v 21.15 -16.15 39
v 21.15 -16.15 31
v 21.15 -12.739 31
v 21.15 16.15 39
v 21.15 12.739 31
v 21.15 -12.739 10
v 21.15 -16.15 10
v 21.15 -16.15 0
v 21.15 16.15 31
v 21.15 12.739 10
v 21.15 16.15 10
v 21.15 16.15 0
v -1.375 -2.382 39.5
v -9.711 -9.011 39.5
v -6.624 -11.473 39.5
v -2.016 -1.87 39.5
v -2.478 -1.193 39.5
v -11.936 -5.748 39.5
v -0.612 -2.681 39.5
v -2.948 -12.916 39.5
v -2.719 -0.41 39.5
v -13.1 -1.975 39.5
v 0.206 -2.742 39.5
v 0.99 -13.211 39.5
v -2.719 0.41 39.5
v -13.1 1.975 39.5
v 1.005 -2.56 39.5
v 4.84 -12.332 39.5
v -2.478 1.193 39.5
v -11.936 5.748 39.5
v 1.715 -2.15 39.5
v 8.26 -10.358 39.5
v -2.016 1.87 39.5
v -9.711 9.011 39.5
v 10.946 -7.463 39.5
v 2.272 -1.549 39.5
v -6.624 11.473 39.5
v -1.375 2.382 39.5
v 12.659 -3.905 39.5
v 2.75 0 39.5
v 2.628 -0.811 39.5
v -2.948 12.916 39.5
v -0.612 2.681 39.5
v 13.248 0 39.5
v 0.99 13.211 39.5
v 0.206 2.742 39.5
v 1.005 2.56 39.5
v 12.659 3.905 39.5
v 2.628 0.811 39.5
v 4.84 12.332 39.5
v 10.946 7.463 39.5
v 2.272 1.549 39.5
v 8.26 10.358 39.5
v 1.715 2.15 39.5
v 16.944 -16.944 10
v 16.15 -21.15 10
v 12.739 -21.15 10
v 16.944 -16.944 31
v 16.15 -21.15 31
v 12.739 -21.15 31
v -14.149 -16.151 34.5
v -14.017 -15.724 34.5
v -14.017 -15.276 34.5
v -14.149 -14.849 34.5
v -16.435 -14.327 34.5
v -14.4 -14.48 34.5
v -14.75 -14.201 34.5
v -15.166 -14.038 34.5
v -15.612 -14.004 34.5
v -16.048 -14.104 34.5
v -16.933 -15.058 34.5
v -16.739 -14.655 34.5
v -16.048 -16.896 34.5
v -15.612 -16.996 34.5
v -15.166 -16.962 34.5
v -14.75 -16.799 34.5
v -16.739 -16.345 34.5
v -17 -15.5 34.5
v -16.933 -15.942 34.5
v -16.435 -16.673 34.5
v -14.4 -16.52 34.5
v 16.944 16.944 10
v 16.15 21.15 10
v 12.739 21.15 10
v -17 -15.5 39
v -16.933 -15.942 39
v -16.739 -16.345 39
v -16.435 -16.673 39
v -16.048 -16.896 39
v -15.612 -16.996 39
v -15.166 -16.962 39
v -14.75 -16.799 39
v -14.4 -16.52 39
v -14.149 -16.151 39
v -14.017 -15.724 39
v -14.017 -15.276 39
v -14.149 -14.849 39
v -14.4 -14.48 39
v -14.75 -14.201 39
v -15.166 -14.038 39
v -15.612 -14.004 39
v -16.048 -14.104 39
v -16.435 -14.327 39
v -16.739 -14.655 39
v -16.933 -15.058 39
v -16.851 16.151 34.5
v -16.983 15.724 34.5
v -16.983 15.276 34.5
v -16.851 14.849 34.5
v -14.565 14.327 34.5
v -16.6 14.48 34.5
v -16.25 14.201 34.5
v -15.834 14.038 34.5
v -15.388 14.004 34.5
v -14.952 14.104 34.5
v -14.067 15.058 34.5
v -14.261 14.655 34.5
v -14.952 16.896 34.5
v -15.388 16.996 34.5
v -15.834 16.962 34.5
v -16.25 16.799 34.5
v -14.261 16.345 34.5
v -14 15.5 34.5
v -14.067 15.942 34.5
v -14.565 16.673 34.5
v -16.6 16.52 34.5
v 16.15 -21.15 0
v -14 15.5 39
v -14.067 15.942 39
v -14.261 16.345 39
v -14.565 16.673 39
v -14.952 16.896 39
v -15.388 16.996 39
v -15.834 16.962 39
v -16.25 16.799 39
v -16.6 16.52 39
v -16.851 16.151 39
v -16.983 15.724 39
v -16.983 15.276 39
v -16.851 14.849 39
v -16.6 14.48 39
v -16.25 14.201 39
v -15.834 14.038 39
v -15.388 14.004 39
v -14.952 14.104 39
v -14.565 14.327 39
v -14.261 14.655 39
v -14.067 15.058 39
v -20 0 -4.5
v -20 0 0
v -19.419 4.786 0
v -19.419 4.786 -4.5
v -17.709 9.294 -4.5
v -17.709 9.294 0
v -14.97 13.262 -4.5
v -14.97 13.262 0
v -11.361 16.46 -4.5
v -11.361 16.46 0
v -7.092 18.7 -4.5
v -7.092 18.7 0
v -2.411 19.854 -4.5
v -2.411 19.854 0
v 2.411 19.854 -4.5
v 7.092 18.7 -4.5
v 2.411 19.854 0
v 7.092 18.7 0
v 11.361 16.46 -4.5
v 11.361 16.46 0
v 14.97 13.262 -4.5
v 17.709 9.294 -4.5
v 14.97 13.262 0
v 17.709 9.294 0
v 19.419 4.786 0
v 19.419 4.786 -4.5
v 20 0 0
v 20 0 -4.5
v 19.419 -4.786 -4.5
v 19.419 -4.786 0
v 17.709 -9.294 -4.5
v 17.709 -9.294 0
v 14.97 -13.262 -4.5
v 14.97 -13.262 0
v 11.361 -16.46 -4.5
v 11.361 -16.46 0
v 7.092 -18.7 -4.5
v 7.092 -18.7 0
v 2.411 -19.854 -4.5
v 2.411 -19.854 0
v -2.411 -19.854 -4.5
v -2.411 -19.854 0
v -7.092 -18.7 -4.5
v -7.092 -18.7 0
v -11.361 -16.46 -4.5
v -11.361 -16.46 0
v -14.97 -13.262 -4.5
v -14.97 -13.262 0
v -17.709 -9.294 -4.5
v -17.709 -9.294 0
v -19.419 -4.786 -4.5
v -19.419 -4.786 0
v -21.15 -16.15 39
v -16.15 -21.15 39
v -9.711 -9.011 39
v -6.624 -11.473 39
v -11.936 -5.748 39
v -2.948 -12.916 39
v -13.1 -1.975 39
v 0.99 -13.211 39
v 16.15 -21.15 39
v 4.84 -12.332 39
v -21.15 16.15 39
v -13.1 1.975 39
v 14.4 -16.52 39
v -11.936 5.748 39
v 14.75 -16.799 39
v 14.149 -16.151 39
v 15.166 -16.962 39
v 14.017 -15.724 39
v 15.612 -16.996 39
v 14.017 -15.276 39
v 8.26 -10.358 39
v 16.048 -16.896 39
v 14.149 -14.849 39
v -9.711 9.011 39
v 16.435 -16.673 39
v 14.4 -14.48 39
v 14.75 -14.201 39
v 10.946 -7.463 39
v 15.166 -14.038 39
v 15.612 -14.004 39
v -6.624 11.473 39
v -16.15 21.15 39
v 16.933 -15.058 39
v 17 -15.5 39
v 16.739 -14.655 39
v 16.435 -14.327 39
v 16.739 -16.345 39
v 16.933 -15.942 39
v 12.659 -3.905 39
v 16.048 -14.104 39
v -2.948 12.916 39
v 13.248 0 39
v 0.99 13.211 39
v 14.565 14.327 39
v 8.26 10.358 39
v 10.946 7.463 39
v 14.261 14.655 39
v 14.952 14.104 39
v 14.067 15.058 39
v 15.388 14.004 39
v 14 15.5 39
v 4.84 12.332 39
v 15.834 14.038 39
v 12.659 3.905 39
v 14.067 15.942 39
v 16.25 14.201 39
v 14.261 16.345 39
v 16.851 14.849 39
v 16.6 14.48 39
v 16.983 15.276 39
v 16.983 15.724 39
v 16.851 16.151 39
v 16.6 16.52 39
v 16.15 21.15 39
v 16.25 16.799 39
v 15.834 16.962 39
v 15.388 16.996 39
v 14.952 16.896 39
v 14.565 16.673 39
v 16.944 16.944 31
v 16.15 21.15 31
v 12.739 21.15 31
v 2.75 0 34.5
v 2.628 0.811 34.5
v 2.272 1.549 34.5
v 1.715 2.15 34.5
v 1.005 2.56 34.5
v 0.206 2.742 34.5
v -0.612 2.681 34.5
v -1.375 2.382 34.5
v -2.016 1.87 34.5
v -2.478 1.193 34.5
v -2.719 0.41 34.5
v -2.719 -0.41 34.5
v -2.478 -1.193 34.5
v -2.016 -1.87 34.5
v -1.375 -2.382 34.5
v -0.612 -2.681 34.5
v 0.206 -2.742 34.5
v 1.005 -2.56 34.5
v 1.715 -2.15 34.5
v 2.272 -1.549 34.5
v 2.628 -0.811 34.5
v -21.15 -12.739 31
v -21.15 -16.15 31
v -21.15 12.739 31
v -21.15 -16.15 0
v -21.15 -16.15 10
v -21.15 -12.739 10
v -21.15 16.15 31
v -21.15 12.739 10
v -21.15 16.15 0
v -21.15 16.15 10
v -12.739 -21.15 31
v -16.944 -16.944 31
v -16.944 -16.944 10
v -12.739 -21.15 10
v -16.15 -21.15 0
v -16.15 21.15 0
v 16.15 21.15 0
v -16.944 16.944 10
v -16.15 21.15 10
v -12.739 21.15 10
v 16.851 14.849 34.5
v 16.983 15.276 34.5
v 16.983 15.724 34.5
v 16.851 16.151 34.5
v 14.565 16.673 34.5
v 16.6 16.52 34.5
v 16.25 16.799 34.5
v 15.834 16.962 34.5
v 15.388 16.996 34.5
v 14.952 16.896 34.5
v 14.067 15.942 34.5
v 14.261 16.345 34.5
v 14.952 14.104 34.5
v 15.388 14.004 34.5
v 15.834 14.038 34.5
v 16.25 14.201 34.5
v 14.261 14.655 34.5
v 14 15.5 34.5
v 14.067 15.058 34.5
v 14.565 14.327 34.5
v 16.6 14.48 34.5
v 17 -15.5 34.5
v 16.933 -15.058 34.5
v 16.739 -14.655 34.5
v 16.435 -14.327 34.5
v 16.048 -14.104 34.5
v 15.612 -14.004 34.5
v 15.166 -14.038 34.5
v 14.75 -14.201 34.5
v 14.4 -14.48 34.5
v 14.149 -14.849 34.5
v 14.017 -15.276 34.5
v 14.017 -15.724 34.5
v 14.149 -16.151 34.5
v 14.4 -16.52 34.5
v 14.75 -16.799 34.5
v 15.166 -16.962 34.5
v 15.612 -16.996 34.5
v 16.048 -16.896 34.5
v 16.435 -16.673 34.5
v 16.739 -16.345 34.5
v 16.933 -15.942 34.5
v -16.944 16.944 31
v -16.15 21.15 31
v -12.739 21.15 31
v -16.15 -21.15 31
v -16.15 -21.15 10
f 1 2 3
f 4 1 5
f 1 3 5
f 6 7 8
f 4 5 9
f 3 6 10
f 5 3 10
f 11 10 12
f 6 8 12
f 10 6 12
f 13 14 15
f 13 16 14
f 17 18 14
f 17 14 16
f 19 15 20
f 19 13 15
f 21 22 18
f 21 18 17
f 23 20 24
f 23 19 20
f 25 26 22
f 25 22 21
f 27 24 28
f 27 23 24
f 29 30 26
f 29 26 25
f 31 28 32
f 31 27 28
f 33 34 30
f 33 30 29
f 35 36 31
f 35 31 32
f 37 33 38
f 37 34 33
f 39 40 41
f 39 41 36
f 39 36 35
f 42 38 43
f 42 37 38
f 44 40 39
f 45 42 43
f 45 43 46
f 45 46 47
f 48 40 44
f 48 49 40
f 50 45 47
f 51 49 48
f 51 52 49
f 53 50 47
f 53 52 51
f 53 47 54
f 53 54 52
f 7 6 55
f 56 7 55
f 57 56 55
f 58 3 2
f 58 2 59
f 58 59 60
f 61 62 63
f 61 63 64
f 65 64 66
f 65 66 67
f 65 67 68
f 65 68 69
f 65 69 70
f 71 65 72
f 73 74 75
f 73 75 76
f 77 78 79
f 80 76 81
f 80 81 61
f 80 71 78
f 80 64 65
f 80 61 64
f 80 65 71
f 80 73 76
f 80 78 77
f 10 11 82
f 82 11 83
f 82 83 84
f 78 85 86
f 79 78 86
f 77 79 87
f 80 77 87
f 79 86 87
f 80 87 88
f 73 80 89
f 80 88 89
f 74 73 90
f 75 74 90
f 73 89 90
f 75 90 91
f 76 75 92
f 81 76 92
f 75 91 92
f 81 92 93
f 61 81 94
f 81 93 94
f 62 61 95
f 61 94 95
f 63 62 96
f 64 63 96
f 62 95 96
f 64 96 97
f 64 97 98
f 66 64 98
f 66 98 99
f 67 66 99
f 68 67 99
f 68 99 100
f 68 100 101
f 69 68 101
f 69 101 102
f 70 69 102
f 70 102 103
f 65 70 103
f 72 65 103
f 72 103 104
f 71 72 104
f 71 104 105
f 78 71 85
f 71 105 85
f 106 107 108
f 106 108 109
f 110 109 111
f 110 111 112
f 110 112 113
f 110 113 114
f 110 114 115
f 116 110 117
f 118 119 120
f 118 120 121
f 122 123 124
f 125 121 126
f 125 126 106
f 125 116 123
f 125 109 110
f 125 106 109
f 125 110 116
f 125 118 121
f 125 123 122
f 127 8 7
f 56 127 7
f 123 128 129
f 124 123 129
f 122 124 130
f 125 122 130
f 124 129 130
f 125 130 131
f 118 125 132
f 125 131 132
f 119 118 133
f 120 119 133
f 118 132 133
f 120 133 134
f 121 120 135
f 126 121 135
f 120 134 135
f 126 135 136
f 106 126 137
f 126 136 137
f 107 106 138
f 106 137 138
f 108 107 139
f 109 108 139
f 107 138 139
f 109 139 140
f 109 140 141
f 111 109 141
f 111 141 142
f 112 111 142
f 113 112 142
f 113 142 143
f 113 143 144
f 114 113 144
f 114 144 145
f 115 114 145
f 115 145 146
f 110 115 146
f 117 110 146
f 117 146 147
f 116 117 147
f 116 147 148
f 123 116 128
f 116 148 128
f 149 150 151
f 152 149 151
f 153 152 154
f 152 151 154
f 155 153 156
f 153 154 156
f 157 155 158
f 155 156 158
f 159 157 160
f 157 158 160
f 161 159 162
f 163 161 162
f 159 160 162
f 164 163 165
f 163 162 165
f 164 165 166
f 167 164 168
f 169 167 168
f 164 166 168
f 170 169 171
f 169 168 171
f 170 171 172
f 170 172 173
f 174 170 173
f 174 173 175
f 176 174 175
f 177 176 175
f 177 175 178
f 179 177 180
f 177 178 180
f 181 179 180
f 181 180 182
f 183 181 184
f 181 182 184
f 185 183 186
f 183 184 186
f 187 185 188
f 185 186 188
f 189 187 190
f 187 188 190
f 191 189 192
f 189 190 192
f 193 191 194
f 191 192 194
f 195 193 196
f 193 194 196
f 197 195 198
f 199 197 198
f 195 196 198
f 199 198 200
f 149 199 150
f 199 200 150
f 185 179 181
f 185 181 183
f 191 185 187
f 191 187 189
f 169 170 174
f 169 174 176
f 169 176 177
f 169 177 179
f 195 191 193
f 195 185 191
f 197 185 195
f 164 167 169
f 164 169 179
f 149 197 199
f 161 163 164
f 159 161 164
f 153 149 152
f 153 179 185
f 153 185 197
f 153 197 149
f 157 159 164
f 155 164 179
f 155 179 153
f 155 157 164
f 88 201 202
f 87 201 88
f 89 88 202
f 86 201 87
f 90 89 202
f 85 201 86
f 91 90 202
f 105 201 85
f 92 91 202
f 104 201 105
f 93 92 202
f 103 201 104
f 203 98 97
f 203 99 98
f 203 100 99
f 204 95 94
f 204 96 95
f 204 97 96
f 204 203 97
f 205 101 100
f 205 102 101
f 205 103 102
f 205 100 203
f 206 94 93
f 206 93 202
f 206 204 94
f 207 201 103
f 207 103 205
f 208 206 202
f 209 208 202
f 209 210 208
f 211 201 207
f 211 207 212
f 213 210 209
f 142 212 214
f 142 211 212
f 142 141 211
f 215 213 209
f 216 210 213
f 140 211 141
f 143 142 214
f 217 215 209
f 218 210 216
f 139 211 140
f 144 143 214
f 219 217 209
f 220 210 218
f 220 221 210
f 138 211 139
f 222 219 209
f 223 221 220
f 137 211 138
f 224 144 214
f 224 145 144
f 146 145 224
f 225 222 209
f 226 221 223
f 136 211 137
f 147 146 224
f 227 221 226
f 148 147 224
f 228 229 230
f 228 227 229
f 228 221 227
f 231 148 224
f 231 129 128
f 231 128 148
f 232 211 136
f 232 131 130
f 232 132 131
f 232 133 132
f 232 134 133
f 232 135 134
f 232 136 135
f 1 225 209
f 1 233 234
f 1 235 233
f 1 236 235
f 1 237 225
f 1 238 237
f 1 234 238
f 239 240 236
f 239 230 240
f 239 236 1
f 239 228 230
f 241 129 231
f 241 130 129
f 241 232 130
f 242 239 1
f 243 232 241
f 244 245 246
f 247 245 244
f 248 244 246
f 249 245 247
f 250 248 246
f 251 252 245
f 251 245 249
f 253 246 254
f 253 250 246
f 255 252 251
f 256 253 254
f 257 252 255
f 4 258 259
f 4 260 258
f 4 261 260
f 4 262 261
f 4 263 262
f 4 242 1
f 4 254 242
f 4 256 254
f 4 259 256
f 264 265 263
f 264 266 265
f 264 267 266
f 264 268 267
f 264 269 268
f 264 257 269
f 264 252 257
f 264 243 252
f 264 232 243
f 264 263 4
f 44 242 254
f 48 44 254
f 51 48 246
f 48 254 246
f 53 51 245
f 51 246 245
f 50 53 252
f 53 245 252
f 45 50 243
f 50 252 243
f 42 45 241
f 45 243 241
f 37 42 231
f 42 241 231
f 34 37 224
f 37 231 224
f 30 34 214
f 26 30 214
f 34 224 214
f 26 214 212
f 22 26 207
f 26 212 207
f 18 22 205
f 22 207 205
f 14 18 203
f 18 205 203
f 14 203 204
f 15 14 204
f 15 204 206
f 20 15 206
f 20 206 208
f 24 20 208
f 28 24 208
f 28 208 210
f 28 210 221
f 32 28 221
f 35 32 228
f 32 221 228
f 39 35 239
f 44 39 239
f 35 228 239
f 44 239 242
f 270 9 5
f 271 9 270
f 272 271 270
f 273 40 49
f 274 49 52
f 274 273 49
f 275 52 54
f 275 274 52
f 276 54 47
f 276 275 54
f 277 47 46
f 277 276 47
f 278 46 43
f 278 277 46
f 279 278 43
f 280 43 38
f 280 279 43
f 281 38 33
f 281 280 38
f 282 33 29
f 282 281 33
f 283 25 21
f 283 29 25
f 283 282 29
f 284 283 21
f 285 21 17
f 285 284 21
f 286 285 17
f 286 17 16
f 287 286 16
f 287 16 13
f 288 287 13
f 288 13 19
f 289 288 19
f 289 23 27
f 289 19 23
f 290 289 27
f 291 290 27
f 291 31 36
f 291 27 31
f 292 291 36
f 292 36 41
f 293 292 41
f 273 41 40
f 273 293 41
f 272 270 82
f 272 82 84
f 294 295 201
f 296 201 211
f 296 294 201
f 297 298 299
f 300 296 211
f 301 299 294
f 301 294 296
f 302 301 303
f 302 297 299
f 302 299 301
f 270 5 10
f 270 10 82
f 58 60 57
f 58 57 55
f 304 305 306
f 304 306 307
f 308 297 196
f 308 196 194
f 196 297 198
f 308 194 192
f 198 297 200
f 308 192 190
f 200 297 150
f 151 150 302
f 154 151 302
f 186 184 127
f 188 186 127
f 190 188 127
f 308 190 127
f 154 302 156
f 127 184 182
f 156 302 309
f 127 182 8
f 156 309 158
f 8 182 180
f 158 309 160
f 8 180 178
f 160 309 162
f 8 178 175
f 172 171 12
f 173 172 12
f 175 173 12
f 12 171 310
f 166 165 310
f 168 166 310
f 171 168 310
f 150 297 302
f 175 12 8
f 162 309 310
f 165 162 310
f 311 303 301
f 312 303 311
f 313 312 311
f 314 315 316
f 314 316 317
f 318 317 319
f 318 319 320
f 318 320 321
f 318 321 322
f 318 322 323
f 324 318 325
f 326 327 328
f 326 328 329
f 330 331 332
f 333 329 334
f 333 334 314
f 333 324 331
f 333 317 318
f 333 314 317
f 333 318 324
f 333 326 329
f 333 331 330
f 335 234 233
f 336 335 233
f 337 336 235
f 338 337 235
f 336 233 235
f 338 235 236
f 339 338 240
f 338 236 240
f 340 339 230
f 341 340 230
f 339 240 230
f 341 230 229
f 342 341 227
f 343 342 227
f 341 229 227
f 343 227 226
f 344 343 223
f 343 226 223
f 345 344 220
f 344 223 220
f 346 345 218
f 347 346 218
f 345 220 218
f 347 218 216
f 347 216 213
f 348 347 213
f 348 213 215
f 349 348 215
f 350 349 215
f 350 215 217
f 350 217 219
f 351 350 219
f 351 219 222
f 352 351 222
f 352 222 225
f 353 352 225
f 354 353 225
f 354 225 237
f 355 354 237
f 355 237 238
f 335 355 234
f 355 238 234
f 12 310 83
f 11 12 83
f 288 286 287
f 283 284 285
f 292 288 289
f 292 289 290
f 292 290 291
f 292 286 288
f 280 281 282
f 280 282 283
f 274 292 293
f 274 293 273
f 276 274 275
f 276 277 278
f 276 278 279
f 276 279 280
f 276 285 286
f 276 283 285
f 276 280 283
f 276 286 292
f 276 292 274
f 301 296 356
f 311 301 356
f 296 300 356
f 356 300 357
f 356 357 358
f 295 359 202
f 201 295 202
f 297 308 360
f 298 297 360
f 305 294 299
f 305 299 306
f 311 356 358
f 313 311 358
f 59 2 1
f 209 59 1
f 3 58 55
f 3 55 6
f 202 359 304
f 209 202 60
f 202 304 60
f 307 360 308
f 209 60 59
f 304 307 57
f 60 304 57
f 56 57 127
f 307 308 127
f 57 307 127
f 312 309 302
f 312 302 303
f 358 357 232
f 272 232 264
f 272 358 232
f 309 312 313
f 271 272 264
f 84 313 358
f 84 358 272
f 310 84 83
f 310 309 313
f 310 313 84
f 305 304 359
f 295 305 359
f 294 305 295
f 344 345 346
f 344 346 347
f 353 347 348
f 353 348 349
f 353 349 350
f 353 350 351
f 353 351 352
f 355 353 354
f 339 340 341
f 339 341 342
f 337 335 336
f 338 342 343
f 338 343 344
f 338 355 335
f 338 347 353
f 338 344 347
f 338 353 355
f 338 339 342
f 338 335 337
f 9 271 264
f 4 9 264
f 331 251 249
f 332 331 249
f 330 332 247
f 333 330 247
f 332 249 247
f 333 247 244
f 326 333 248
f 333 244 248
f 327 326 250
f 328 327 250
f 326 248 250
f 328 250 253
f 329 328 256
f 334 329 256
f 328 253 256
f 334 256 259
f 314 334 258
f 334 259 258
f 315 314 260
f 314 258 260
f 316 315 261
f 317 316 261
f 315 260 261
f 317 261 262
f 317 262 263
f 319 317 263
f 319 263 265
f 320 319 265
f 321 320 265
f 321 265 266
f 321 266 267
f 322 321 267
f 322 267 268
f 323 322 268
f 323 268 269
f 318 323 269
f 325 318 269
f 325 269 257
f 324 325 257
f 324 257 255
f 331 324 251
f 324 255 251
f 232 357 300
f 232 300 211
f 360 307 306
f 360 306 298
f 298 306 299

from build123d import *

# Parameters (mm, degrees)
SKETCH2_W               = 42.3
SKETCH2_H               = 42.3
BOSS_EXTRUDE5_DEPTH     = 39
CHAMFER4_SIZE           = 5
CUT_EXTRUDE1_START      = -8
CUT_EXTRUDE1_DEPTH      = 21
SKETCH5_R               = 20
BOSS_EXTRUDE6_DEPTH     = 4.5
SKETCH7_R               = 1.5
CUT_EXTRUDE3_DEPTH      = 4.5
SKETCH8_R               = 13.24793055
BOSS_EXTRUDE7_DEPTH     = 0.5
CUT_EXTRUDE2_DEPTH      = 53.791050378
CUT_EXTRUDE2_DEPTH_BACK = 4.5
SKETCH6_R               = 2.75


with BuildPart() as part:
    # Sketch2 → Boss-Extrude5 (new body)
    with BuildSketch(Plane.XY):
        Rectangle(SKETCH2_W, SKETCH2_H)
    extrude(amount=BOSS_EXTRUDE5_DEPTH)

    # Chamfer4
    chamfer4_edges = [part.edges().sort_by_distance(p)[0] for p in [
        (21.15, -21.15, 19.5),
        (-21.15, -21.15, 19.5),
        (-21.15, 21.15, 19.5),
        (21.15, 21.15, 19.5),
    ]]
    chamfer(chamfer4_edges, length=CHAMFER4_SIZE)

    # Sketch3 → Cut-Extrude1 (cut)
    with BuildSketch(Plane.XY.offset(39).offset(CUT_EXTRUDE1_START)):
        Polygon((-21.15, 21.15), (-21.15, 12.738640345), (-16.944320172, 16.944320172), (-12.738640345, 21.15), align=None)
        Polygon((21.15, -12.738640345), (21.15, -21.15), (12.738640345, -21.15), (16.944320172, -16.944320172), align=None)
        Polygon((12.738640345, 21.15), (21.15, 21.15), (21.15, 12.738640345), (16.944320172, 16.944320172), align=None)
        Polygon((-12.738640345, -21.15), (-21.15, -21.15), (-21.15, -12.738640345), (-16.944320172, -16.944320172), align=None)
    extrude(amount=-CUT_EXTRUDE1_DEPTH, mode=Mode.SUBTRACT)

    # Sketch5 → Boss-Extrude6 (add)
    with BuildSketch(Plane(origin=(0, 0, 0), x_dir=(-1, 0, 0), z_dir=(0, 0, -1))):
        Circle(SKETCH5_R)
    extrude(amount=BOSS_EXTRUDE6_DEPTH)

    # Sketch7 → Cut-Extrude3 (cut)
    with BuildSketch(Plane.XY.offset(39)):
        with Locations((-15.5, 15.5)):
            Circle(SKETCH7_R)
        with Locations(Location((-15.5, -15.5, 0), (0, 0, 180))):
            Circle(SKETCH7_R)
        with Locations(Location((15.5, 15.5, 0), (0, 0, 180))):
            Circle(SKETCH7_R)
        with Locations((15.5, -15.5)):
            Circle(SKETCH7_R)
    extrude(amount=-CUT_EXTRUDE3_DEPTH, mode=Mode.SUBTRACT)

    # Sketch8 → Boss-Extrude7 (add)
    with BuildSketch(Plane.XY.offset(39)):
        Circle(SKETCH8_R)
    extrude(amount=BOSS_EXTRUDE7_DEPTH)

    # Sketch6 → Cut-Extrude2 (cut, two sides: drawn at the far end of the back side and taken through both)
    with BuildSketch(Plane.XY.offset(39).offset(-CUT_EXTRUDE2_DEPTH_BACK)):
        Circle(SKETCH6_R)
    extrude(amount=CUT_EXTRUDE2_DEPTH + CUT_EXTRUDE2_DEPTH_BACK, mode=Mode.SUBTRACT)


solid = part.part
